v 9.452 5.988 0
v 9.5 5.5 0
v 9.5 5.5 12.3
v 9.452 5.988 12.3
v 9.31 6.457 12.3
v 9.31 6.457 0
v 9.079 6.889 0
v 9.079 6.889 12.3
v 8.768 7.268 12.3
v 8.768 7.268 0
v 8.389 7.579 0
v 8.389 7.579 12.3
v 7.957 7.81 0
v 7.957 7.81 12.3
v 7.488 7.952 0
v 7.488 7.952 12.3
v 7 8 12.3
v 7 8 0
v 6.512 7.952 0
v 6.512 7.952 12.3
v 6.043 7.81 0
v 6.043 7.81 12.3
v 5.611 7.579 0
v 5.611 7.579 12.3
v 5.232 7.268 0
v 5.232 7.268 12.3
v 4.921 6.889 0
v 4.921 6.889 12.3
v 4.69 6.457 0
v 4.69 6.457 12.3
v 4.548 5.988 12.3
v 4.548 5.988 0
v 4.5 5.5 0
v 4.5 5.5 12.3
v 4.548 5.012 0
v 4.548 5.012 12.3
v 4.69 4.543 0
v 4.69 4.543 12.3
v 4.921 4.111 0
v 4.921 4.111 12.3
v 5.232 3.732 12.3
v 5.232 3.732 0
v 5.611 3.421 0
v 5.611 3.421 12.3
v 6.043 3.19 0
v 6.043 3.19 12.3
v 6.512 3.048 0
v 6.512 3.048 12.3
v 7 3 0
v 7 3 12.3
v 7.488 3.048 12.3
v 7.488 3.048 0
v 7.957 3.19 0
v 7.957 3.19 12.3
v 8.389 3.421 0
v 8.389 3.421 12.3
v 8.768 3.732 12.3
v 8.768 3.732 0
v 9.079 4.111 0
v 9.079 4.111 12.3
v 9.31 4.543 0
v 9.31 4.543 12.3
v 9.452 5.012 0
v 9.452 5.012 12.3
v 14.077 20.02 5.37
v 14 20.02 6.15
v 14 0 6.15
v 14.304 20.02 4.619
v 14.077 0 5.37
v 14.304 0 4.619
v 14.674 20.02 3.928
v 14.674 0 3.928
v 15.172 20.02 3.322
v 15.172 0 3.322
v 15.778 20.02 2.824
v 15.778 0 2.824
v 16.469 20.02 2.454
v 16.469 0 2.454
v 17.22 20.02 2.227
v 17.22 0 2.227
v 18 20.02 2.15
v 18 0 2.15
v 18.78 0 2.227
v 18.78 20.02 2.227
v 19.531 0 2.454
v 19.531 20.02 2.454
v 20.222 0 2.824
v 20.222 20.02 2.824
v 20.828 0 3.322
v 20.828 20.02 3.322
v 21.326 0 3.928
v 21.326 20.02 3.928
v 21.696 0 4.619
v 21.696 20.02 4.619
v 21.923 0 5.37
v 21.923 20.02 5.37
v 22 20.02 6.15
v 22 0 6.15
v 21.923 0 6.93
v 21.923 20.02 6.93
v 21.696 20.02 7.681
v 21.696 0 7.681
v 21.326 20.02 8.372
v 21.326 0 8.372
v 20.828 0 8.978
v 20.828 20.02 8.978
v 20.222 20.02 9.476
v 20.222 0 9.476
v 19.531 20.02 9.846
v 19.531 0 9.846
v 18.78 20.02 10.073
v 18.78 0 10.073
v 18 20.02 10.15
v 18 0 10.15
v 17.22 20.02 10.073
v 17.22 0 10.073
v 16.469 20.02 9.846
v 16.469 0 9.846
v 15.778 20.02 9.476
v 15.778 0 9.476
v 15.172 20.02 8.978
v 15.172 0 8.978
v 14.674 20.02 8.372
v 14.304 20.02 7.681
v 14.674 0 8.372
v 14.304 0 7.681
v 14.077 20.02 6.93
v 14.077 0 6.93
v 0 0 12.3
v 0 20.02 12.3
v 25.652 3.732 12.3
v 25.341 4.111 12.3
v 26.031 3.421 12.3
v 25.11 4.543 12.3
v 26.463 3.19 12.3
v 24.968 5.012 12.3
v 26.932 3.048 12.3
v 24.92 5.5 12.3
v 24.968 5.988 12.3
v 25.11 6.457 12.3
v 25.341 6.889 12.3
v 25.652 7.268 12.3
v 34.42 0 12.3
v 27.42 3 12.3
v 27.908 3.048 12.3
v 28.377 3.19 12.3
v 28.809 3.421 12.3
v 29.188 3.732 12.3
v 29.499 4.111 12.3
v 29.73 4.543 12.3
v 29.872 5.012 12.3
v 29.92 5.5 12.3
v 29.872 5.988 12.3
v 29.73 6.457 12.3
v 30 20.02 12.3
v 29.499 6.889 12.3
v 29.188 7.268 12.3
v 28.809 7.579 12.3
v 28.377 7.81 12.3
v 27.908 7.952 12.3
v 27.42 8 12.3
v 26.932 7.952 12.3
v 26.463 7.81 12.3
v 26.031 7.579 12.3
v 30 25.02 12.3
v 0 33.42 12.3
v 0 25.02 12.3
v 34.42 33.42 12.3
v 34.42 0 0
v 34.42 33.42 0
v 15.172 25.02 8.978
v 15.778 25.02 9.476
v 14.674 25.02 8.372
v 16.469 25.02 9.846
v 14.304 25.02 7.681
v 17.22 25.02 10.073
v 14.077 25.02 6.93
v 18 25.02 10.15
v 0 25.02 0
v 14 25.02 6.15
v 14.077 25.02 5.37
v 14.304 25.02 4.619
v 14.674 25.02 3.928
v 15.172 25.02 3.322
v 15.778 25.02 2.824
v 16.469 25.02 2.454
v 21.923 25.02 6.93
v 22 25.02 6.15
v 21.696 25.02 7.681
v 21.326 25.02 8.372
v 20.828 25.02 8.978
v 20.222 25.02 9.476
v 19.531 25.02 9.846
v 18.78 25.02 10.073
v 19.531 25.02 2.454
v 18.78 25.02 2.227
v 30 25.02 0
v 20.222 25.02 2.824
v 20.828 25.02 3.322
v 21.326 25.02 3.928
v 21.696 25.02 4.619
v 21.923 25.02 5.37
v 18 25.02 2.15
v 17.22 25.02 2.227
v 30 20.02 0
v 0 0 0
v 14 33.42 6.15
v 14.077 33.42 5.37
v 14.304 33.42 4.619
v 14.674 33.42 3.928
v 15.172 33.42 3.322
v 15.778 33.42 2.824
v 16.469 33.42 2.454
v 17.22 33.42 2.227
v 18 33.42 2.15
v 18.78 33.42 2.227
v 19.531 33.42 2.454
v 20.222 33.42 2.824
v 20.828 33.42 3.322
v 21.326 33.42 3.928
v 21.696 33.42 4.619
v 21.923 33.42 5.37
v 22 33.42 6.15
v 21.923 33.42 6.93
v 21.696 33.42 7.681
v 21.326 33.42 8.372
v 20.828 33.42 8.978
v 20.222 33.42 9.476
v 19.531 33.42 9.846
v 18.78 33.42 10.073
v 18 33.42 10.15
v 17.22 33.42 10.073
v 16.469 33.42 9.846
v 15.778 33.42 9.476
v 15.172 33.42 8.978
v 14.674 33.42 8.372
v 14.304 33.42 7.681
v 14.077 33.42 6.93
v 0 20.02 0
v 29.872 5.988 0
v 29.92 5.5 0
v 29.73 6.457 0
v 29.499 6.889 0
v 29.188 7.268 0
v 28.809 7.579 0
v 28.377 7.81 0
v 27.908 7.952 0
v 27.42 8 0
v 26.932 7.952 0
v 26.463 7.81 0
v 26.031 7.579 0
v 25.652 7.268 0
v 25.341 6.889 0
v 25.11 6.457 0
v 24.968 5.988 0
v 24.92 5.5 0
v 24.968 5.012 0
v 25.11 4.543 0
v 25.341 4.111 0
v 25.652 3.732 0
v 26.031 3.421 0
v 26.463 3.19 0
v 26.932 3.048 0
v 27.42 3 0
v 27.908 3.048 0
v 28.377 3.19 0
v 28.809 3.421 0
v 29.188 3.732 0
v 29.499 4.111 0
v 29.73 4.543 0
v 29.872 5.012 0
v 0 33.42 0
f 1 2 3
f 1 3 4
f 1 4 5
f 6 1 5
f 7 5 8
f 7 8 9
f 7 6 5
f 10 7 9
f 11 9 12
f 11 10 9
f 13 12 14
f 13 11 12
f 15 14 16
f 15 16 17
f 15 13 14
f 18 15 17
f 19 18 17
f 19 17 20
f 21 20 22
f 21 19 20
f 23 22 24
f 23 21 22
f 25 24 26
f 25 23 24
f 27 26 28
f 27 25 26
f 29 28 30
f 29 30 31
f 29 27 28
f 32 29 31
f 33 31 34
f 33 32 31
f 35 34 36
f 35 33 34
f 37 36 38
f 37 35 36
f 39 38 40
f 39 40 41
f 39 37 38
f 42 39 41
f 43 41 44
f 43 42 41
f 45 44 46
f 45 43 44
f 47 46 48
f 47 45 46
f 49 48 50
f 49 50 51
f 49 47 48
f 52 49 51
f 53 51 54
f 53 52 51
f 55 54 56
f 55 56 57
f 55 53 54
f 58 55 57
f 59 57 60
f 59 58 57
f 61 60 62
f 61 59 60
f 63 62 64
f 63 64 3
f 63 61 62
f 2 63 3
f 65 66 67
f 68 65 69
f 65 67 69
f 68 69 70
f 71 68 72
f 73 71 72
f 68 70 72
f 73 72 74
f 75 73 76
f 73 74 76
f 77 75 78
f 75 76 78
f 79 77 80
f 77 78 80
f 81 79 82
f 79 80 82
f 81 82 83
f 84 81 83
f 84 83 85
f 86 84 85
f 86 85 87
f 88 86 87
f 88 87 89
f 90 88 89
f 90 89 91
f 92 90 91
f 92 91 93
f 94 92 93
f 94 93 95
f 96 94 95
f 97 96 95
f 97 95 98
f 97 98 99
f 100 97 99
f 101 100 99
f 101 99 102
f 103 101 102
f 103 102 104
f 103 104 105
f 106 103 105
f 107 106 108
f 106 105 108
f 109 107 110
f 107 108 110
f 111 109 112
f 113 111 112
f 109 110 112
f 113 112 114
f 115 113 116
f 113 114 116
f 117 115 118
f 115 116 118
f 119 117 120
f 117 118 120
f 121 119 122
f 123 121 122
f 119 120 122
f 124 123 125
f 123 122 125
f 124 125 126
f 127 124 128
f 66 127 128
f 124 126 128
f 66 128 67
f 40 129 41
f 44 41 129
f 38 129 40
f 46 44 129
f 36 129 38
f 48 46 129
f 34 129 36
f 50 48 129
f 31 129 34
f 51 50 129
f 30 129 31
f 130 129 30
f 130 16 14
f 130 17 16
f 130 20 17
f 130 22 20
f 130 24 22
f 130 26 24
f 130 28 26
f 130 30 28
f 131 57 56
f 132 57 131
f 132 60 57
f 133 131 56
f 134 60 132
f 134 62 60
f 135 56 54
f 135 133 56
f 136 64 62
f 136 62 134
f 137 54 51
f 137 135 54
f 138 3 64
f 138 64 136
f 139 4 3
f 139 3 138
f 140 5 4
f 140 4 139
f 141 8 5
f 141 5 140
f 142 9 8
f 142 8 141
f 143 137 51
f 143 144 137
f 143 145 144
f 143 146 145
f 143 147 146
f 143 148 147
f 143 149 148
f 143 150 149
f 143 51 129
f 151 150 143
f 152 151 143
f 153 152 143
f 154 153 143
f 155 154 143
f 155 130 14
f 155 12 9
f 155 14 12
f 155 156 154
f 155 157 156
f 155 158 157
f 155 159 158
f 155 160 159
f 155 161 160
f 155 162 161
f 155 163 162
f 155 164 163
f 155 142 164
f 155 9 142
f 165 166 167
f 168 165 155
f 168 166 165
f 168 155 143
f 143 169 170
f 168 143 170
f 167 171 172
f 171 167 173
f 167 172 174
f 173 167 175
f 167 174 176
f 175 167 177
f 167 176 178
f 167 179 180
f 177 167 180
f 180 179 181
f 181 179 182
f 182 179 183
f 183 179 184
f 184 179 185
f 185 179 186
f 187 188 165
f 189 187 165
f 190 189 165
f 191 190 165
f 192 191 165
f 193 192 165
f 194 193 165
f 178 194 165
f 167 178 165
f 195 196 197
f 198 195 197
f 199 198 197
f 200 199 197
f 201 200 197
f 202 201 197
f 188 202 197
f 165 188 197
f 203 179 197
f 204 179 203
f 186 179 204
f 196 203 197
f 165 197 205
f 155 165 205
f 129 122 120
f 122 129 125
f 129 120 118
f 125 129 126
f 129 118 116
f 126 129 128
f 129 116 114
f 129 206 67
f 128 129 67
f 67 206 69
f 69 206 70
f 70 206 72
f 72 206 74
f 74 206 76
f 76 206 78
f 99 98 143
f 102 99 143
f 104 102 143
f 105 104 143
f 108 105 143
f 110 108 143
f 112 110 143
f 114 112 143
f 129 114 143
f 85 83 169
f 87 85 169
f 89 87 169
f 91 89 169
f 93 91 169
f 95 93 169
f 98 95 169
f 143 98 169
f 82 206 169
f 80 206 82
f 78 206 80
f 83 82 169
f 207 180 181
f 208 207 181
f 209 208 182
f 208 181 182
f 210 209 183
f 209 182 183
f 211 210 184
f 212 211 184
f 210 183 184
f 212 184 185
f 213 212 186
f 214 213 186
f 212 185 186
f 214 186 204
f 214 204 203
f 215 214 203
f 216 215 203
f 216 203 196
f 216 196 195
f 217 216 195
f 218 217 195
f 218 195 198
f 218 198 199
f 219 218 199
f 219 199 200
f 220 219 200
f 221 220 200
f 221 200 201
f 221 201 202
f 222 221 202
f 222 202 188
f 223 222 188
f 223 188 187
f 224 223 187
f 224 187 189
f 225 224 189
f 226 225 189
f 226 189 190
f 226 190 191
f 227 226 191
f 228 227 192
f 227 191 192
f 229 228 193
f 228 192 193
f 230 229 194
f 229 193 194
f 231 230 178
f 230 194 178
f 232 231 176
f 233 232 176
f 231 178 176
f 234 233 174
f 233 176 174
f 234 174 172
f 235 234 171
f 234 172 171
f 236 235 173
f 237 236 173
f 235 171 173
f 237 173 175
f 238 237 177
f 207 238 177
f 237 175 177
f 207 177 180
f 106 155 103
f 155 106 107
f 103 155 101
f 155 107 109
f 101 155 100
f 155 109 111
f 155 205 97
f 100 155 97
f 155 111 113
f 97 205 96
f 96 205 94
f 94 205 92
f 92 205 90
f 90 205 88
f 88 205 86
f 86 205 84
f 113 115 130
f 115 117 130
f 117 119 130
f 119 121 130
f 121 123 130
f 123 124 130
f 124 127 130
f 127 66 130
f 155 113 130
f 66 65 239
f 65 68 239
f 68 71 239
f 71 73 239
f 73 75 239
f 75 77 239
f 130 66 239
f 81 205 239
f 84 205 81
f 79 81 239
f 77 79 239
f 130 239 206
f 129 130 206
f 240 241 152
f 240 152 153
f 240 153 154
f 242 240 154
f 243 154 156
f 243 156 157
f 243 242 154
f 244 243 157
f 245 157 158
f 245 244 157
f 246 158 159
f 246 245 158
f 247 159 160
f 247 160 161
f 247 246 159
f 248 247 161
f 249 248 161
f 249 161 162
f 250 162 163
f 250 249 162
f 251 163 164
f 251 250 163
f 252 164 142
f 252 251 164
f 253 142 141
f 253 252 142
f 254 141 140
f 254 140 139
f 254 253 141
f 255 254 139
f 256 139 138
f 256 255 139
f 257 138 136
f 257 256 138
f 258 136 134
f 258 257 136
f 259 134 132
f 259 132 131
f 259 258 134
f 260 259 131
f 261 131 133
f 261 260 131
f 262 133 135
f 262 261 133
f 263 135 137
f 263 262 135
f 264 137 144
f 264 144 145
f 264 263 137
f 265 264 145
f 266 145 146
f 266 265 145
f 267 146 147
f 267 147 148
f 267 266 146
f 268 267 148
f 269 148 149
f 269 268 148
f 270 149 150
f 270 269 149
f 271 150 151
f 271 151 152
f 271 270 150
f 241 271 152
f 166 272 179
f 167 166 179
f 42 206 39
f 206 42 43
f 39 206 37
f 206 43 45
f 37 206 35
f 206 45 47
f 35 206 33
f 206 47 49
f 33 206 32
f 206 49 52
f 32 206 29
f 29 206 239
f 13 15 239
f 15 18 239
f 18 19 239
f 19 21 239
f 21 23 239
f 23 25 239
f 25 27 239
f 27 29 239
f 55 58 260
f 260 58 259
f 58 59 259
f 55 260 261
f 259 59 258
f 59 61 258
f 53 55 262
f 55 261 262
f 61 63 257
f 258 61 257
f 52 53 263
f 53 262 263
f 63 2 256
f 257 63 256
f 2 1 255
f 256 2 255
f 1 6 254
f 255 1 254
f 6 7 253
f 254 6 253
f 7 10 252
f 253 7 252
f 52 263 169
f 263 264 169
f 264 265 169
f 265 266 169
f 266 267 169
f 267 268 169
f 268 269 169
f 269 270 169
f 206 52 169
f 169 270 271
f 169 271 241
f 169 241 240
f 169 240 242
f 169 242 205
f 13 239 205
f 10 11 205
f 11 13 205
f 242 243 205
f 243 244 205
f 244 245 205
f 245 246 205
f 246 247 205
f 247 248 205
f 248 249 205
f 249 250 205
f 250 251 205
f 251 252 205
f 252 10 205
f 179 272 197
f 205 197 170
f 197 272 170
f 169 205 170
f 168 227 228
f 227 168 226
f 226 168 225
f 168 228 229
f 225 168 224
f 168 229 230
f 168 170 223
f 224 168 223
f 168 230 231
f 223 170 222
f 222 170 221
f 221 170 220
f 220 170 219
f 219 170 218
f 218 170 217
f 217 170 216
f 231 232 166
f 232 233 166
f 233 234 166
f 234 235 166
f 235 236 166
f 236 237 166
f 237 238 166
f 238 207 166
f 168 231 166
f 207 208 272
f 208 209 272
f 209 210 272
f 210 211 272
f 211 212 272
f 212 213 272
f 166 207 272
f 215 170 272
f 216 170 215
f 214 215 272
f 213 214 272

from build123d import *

# Parameters (mm, degrees)
SKETCH1_R           = 2.5
BOSS_EXTRUDE1_DEPTH = 12.3
SKETCH2_R           = 4
CUT_EXTRUDE1_DEPTH  = 34.42


with BuildPart() as part:
    # Sketch1 → Boss-Extrude1 (new body)
    with BuildSketch(Plane.XY):
        Polygon((0, 25.02), (30, 25.02), (30, 20.02), (0, 20.02), (0, 0), (34.42, 0), (34.42, 33.42), (0, 33.42), align=None)
        with Locations((27.42, 5.5)):
            Circle(SKETCH1_R, mode=Mode.SUBTRACT)
        with Locations((7, 5.5)):
            Circle(SKETCH1_R, mode=Mode.SUBTRACT)
    extrude(amount=BOSS_EXTRUDE1_DEPTH)

    # Sketch2 → Cut-Extrude1 (cut, through all)
    with BuildSketch(Plane(origin=(0, 0, 0), x_dir=(-1, 0, 0), z_dir=(0, -1, 0))):
        with Locations((-18, -6.15)):
            Circle(SKETCH2_R)
    extrude(amount=-CUT_EXTRUDE1_DEPTH, mode=Mode.SUBTRACT)


solid = part.part
